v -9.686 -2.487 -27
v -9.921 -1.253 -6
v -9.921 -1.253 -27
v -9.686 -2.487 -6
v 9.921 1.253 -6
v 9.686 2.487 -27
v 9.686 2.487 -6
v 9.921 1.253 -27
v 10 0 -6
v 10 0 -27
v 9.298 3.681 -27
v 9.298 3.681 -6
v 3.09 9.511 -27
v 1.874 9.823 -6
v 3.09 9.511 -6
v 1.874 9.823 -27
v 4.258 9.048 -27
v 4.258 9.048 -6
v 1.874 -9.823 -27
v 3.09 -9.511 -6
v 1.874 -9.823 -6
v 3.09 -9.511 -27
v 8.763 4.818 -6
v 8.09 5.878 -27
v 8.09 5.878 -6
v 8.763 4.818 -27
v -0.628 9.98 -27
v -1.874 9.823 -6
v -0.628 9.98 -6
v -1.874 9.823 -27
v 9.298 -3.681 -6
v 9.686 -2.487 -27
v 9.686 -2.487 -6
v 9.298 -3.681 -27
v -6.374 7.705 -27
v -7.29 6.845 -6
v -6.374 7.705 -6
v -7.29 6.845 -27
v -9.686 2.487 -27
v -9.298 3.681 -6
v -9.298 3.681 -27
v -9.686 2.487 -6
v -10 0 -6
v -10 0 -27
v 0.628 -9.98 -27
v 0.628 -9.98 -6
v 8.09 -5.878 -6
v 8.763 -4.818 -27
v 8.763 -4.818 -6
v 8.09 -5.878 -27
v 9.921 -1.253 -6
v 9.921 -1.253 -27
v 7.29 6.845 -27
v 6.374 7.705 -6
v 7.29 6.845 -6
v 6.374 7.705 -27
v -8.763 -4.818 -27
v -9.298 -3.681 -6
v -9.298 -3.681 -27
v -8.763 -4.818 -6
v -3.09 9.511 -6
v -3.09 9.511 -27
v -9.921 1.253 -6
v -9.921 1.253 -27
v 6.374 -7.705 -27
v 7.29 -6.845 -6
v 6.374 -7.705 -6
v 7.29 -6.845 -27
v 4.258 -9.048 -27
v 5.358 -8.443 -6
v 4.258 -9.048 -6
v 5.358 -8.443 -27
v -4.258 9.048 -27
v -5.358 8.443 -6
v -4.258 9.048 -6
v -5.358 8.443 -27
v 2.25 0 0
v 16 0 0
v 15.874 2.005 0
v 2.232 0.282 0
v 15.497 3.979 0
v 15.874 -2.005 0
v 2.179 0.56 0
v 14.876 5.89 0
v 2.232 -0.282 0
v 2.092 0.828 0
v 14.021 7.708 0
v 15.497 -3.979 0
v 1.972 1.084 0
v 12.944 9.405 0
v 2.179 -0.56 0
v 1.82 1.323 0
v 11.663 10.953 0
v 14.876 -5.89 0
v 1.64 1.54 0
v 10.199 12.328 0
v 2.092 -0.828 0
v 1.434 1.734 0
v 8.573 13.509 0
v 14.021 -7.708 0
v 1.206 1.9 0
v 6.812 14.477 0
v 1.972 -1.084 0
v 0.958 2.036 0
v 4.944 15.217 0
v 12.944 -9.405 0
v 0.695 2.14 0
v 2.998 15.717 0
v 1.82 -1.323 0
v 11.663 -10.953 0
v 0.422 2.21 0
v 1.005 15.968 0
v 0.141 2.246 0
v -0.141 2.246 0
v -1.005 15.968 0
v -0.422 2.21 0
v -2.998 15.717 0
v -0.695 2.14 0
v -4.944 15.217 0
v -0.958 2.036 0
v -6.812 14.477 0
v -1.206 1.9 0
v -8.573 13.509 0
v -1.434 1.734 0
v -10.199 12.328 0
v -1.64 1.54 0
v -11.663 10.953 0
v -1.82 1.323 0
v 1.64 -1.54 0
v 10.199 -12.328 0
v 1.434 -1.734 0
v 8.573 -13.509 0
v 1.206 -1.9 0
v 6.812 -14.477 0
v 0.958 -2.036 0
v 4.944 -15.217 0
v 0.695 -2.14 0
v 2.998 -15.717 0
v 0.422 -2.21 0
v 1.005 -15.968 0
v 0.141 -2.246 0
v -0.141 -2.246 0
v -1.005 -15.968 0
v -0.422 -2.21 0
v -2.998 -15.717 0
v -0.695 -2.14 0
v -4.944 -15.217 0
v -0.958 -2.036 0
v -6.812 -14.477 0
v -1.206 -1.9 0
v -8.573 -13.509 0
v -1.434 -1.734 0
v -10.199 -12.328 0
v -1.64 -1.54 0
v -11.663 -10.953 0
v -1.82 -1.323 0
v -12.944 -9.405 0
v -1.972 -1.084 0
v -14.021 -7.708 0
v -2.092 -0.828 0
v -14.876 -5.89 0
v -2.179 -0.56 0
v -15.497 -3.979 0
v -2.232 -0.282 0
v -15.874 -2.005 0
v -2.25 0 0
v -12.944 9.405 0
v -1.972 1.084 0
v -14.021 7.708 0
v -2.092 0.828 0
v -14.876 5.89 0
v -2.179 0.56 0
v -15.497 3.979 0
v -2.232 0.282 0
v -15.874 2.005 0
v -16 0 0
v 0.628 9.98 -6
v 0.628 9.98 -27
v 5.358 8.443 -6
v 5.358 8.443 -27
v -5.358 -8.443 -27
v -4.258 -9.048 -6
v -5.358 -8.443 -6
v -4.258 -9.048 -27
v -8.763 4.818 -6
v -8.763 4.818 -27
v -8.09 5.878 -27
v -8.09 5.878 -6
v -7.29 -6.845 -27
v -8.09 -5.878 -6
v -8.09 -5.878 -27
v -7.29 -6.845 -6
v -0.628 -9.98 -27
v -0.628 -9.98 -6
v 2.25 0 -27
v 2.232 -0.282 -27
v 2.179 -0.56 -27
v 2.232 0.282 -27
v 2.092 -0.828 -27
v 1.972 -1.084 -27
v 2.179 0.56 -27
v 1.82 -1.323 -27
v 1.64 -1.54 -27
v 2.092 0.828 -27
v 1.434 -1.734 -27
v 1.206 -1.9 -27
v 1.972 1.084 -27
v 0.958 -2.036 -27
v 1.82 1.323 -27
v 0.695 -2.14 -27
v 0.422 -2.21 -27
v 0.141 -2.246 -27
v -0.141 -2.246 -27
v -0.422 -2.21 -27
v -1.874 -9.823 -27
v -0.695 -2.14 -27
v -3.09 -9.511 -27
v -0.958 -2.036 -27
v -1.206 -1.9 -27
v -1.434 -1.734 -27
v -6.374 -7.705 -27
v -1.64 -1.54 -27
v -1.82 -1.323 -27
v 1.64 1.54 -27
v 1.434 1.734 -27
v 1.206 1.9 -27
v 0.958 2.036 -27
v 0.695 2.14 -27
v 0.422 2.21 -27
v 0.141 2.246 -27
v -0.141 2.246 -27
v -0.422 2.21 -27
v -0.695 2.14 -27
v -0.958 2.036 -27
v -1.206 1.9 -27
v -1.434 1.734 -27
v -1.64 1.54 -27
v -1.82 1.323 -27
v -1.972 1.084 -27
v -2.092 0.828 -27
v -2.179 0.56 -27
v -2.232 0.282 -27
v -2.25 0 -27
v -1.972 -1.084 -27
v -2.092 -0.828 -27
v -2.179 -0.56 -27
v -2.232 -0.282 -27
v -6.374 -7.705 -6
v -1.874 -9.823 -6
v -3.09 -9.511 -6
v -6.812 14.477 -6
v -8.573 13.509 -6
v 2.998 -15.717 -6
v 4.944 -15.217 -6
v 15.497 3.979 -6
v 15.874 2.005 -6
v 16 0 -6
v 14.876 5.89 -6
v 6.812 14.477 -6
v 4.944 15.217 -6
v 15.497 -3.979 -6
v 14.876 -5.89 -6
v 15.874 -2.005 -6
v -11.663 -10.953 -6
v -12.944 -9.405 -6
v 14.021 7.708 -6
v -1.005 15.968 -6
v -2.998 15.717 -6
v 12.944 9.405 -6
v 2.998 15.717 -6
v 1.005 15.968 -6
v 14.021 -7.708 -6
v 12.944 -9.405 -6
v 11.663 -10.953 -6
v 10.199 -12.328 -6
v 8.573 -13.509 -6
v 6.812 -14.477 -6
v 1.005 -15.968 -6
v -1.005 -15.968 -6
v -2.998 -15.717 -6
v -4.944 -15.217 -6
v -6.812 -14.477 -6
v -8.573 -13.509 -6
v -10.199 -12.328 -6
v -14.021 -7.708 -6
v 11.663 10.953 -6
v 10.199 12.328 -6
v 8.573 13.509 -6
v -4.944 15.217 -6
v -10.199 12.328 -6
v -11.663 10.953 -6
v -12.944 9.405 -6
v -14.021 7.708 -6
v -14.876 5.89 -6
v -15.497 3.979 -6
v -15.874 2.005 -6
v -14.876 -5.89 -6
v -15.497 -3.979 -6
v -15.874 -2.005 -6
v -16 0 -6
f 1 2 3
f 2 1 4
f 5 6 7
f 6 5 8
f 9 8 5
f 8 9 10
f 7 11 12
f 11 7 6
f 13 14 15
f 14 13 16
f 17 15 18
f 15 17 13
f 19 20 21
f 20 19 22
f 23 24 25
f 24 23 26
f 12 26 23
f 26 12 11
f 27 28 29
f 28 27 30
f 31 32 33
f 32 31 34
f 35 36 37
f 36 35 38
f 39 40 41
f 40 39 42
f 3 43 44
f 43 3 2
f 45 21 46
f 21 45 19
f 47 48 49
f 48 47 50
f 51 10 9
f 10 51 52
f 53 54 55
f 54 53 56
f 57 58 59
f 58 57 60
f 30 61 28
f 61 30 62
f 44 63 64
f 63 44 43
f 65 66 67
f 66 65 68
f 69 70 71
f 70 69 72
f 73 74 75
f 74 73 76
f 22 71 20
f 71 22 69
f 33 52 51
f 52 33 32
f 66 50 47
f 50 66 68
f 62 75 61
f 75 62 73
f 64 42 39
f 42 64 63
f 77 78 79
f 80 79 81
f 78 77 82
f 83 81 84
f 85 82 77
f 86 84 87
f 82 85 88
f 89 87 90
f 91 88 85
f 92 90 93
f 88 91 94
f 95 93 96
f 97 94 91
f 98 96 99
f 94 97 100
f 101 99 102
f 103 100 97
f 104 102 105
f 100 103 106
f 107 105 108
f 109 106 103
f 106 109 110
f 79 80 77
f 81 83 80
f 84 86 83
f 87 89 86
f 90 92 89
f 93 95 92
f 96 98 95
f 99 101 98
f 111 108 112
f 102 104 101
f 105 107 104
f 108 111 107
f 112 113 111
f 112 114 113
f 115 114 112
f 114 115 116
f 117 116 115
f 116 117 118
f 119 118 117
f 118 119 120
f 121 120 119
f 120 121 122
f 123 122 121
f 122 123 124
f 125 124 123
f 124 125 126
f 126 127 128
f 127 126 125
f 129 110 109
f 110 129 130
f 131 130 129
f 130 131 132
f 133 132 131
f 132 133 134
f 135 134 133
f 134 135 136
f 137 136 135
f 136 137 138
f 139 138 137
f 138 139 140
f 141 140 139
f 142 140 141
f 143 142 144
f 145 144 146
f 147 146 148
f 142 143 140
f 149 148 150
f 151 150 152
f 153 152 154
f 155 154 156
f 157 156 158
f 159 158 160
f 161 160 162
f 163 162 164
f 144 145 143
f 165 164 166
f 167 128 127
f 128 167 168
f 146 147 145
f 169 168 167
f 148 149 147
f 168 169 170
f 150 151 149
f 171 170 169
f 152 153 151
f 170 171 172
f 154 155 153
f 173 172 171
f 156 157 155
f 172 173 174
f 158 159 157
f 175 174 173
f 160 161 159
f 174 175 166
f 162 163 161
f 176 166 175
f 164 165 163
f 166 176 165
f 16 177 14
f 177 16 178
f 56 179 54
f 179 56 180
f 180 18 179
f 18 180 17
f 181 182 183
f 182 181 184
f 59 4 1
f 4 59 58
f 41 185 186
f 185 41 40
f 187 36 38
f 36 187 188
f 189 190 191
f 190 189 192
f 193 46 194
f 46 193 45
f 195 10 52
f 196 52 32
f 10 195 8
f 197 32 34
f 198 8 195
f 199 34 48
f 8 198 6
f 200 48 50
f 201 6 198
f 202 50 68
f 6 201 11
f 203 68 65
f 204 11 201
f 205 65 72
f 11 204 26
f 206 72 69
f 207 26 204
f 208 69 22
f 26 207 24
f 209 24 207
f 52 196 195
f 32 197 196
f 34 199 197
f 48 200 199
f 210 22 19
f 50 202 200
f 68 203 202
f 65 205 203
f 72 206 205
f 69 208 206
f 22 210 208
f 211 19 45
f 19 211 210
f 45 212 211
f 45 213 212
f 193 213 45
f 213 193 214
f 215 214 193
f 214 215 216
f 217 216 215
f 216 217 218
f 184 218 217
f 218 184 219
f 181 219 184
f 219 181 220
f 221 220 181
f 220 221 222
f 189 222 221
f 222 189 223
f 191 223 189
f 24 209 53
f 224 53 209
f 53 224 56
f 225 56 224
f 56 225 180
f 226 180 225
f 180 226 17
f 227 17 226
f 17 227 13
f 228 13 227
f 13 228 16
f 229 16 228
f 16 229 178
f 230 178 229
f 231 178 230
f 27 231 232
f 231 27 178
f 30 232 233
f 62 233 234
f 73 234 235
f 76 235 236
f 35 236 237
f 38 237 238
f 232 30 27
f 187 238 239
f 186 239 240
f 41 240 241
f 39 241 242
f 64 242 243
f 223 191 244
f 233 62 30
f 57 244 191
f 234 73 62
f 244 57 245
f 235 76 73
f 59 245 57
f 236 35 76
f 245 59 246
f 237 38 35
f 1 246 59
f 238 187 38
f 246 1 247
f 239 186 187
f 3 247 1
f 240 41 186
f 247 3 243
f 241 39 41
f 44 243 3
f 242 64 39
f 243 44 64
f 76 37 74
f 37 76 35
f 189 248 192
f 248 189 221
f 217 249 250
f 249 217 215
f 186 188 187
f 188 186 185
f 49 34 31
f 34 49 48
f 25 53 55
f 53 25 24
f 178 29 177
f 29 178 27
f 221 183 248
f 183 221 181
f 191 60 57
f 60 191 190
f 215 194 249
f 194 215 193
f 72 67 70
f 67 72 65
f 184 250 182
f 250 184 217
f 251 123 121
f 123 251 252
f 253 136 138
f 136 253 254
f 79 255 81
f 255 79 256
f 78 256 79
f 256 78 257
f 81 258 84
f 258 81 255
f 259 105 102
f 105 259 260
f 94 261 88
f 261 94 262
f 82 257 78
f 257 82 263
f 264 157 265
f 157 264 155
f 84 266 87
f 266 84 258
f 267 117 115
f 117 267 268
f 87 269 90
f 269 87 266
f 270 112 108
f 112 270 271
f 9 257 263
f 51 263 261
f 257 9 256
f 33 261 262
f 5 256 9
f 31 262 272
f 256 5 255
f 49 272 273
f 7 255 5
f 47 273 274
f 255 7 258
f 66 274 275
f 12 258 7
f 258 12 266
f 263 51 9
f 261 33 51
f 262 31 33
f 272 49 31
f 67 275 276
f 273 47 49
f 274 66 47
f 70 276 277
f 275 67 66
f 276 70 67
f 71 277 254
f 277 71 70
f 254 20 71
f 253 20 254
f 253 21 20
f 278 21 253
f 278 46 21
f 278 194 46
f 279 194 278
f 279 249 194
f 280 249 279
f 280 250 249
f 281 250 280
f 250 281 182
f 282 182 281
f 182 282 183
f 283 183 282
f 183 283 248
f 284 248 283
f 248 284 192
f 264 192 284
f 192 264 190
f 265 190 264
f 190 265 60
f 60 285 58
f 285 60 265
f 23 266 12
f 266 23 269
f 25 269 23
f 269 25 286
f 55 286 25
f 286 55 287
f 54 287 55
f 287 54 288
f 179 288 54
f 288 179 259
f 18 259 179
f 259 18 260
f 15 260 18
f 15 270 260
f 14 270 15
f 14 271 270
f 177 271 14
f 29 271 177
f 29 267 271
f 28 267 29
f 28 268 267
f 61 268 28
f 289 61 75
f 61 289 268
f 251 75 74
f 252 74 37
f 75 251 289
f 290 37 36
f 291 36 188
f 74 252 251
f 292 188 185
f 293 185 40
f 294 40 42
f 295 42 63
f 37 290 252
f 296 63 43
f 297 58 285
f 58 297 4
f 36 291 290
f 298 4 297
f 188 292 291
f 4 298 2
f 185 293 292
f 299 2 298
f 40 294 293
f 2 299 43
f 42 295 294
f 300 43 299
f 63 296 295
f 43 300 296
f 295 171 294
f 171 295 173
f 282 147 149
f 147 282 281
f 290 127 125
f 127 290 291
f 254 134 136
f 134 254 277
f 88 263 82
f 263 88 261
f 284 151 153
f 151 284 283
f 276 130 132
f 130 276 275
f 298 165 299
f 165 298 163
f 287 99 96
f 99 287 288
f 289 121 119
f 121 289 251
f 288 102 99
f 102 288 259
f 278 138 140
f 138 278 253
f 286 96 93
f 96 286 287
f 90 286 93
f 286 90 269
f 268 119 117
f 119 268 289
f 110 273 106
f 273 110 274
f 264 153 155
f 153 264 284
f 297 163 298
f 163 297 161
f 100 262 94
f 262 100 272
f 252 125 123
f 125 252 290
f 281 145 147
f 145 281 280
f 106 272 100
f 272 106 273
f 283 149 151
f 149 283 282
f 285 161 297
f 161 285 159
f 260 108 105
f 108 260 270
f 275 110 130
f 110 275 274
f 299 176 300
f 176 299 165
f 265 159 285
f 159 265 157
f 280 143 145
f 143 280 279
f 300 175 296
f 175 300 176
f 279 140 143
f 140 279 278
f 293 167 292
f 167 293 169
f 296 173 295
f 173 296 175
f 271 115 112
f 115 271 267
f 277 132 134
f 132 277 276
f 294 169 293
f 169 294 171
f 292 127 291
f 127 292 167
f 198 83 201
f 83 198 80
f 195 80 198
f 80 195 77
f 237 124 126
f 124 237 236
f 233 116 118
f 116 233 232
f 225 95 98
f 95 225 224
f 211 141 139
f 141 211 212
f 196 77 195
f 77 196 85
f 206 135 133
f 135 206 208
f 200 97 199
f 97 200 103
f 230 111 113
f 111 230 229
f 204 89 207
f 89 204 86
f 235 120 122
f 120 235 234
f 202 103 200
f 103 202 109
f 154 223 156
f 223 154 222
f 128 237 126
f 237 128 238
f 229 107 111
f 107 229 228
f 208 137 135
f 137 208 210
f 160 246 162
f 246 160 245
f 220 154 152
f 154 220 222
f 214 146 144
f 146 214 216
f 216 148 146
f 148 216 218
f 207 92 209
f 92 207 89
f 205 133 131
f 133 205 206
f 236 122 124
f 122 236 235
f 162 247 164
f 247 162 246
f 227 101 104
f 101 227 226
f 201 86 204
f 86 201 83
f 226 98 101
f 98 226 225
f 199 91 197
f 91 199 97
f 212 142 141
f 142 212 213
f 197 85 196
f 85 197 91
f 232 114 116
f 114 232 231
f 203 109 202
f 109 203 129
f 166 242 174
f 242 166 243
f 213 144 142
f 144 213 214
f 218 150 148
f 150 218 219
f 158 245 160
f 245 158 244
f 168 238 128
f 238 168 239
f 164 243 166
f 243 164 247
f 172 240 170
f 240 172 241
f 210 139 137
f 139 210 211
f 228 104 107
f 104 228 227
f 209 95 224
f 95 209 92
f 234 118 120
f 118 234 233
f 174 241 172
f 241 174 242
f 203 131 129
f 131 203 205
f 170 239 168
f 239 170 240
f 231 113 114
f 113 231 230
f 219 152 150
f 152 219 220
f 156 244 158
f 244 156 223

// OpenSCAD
$fn = 50;


difference() {
	union() {
		translate(v = [0, 0, -27.0000000000]) {
			cylinder(h = 27, r = 10.0000000000);
		}
		translate(v = [0, 0, -6.0000000000]) {
			cylinder(h = 6, r = 16.0000000000);
		}
	}
	union() {
		#translate(v = [0, 0, -27]) {
			cylinder(h = 27, r = 2.2500000000);
		}
	}
}
